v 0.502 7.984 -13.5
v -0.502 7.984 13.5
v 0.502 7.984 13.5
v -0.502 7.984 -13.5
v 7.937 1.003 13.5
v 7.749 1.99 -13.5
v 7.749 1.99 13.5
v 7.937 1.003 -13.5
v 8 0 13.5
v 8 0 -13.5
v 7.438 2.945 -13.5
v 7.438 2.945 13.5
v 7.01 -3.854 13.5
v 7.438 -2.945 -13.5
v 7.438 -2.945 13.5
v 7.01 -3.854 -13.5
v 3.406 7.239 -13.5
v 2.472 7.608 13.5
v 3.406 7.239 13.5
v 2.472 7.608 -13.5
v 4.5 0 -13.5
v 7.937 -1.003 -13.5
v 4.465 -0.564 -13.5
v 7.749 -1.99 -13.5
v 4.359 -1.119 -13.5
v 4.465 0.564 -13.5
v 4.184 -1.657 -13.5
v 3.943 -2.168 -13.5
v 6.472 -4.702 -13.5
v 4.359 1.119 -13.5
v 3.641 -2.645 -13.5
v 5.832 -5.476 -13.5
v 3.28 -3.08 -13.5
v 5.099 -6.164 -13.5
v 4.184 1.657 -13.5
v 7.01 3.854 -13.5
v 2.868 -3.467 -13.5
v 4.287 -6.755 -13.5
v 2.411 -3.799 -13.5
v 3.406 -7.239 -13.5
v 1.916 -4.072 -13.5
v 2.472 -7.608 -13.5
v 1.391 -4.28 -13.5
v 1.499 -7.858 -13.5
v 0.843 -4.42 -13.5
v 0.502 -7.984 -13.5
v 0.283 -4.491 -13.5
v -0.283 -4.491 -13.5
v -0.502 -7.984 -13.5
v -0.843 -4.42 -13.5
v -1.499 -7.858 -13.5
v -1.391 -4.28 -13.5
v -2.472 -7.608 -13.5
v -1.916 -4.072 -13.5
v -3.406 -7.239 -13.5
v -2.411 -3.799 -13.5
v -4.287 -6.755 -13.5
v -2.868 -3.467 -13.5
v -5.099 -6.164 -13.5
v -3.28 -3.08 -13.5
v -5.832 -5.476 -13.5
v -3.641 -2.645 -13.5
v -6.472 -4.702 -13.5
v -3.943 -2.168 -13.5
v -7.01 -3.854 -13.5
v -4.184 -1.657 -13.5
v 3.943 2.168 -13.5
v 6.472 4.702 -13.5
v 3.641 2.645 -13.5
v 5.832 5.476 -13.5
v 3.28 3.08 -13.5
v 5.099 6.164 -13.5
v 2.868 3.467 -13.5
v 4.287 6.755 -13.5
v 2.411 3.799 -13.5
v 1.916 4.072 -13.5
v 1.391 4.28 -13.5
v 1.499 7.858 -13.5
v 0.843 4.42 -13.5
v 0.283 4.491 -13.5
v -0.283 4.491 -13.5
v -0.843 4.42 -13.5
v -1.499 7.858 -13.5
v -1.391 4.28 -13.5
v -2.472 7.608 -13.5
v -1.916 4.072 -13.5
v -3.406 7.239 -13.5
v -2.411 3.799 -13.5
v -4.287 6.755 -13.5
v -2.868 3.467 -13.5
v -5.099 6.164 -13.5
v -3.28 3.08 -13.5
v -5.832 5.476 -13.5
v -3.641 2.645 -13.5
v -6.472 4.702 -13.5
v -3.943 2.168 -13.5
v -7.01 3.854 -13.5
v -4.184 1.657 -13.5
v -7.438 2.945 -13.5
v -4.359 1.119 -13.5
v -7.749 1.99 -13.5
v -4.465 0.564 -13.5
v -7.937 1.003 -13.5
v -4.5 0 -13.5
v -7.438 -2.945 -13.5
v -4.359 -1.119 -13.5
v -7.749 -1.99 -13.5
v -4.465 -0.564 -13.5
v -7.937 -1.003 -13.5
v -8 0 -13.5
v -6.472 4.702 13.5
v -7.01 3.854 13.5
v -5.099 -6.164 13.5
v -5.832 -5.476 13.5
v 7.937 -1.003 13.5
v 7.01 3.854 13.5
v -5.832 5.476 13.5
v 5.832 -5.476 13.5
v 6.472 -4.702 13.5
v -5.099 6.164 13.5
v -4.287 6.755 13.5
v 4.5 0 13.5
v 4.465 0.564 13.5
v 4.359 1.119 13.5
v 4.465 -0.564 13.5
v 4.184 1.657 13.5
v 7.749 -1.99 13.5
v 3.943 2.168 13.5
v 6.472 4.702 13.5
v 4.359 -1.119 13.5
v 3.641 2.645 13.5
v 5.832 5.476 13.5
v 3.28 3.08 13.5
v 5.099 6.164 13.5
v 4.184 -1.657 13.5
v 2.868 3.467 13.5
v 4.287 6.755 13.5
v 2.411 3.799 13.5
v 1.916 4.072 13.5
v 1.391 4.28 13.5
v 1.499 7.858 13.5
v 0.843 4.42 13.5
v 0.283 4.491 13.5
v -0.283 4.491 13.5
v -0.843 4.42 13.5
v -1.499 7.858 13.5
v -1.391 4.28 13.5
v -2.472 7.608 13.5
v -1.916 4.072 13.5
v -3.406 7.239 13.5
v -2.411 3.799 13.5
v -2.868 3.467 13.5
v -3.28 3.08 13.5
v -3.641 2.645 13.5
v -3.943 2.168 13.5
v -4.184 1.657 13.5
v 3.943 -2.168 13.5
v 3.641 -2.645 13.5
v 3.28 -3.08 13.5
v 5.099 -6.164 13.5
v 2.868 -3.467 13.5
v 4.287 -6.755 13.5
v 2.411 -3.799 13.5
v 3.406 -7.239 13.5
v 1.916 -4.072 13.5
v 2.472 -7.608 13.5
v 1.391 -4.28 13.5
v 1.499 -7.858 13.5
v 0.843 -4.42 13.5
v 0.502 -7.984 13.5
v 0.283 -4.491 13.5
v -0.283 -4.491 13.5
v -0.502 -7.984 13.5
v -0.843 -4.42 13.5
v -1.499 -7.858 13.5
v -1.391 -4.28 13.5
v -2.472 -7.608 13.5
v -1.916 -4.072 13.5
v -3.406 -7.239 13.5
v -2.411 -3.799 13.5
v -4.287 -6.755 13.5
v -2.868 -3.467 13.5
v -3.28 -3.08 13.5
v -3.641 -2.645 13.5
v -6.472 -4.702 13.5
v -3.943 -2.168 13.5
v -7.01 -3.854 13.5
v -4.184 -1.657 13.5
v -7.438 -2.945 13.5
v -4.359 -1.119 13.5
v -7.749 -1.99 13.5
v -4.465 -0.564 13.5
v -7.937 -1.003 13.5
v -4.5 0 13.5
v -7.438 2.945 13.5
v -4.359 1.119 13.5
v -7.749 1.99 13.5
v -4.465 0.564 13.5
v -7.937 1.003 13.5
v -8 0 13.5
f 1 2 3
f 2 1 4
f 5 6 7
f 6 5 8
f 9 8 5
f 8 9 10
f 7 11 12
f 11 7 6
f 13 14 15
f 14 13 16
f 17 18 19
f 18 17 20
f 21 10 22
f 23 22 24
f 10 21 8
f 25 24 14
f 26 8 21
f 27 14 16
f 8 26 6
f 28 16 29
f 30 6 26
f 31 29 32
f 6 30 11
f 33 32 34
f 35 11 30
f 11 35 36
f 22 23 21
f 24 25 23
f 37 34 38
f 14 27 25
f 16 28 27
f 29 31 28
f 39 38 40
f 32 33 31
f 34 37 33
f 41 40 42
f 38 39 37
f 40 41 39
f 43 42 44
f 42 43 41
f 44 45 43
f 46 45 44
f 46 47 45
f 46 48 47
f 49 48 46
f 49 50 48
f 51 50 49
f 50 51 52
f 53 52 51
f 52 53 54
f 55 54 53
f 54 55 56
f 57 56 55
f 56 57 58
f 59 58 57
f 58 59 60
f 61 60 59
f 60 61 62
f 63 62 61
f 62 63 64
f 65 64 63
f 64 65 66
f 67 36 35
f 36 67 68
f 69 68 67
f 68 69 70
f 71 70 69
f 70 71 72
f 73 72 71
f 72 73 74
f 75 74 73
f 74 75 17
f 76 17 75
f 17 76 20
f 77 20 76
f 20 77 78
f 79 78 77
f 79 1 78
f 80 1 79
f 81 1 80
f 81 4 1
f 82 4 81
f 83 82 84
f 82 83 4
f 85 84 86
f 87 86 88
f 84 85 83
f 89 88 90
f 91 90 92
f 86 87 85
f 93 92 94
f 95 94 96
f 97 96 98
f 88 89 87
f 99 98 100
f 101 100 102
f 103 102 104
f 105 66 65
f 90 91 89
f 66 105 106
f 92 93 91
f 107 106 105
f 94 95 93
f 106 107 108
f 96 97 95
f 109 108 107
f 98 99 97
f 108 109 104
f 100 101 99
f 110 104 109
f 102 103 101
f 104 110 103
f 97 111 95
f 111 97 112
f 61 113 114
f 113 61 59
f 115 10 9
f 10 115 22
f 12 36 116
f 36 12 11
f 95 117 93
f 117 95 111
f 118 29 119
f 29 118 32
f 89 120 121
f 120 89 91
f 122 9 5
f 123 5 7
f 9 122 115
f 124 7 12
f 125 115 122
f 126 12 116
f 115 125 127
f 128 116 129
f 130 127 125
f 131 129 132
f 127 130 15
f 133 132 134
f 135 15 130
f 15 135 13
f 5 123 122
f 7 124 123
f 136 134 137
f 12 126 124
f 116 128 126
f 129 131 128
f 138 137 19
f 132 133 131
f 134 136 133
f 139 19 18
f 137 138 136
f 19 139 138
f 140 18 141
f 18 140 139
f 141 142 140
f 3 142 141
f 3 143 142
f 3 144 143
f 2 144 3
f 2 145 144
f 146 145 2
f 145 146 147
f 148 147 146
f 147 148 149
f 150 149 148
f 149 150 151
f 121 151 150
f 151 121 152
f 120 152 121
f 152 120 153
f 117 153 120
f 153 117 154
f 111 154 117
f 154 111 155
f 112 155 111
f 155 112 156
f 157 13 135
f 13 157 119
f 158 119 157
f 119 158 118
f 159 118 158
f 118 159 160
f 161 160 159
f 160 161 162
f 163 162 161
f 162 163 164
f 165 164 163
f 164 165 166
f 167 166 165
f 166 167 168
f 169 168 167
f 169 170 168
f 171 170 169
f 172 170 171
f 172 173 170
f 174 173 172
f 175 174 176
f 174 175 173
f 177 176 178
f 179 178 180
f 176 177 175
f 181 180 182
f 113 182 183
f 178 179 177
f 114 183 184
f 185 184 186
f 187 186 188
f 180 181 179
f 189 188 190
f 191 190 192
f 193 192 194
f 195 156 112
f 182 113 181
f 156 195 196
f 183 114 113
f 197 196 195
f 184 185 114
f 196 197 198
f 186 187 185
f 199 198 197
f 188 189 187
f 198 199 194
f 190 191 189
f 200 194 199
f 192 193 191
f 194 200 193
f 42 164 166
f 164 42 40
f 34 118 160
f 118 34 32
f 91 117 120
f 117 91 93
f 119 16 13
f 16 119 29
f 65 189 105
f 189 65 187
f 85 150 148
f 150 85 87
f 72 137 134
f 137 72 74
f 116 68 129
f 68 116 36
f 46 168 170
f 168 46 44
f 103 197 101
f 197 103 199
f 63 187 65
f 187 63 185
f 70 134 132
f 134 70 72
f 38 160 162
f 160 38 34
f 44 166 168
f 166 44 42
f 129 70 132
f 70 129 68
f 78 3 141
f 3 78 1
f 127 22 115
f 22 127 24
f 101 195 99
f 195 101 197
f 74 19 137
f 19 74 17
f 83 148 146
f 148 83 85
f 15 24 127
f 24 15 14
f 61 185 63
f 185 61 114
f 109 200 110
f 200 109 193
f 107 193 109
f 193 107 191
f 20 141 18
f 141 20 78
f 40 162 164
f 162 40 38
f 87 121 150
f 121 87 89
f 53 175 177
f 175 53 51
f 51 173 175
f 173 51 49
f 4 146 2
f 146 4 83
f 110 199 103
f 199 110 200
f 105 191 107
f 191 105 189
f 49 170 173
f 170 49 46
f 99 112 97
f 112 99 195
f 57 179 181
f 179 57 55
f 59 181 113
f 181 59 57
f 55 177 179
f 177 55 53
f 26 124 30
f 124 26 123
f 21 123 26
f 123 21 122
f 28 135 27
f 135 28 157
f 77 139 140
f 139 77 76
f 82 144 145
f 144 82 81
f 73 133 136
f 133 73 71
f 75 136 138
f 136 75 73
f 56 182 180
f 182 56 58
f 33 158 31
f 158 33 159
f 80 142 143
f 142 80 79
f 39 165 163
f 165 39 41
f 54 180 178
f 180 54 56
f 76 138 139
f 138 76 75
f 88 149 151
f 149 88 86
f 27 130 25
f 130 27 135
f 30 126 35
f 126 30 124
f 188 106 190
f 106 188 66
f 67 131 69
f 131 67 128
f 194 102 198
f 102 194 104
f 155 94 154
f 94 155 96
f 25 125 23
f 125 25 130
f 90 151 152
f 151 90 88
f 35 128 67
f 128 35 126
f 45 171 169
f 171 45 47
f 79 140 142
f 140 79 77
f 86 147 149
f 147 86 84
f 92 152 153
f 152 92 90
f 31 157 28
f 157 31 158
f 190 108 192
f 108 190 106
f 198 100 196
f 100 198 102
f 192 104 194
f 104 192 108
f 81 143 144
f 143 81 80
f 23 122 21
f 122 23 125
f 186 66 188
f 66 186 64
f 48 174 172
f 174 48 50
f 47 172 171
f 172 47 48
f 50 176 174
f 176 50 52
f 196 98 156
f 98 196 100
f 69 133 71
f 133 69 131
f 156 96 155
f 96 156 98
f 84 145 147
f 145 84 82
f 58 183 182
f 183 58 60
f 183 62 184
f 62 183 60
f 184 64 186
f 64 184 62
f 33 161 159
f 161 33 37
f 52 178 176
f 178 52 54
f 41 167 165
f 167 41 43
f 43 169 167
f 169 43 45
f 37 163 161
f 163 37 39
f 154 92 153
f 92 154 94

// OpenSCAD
$fn = 50;


difference() {
	union() {
		translate(v = [0, 0, -13.5000000000]) {
			cylinder(h = 27, r = 8.0000000000);
		}
	}
	union() {
		translate(v = [0, 0, -100.0000000000]) {
			cylinder(h = 200, r = 4.5000000000);
		}
	}
}
